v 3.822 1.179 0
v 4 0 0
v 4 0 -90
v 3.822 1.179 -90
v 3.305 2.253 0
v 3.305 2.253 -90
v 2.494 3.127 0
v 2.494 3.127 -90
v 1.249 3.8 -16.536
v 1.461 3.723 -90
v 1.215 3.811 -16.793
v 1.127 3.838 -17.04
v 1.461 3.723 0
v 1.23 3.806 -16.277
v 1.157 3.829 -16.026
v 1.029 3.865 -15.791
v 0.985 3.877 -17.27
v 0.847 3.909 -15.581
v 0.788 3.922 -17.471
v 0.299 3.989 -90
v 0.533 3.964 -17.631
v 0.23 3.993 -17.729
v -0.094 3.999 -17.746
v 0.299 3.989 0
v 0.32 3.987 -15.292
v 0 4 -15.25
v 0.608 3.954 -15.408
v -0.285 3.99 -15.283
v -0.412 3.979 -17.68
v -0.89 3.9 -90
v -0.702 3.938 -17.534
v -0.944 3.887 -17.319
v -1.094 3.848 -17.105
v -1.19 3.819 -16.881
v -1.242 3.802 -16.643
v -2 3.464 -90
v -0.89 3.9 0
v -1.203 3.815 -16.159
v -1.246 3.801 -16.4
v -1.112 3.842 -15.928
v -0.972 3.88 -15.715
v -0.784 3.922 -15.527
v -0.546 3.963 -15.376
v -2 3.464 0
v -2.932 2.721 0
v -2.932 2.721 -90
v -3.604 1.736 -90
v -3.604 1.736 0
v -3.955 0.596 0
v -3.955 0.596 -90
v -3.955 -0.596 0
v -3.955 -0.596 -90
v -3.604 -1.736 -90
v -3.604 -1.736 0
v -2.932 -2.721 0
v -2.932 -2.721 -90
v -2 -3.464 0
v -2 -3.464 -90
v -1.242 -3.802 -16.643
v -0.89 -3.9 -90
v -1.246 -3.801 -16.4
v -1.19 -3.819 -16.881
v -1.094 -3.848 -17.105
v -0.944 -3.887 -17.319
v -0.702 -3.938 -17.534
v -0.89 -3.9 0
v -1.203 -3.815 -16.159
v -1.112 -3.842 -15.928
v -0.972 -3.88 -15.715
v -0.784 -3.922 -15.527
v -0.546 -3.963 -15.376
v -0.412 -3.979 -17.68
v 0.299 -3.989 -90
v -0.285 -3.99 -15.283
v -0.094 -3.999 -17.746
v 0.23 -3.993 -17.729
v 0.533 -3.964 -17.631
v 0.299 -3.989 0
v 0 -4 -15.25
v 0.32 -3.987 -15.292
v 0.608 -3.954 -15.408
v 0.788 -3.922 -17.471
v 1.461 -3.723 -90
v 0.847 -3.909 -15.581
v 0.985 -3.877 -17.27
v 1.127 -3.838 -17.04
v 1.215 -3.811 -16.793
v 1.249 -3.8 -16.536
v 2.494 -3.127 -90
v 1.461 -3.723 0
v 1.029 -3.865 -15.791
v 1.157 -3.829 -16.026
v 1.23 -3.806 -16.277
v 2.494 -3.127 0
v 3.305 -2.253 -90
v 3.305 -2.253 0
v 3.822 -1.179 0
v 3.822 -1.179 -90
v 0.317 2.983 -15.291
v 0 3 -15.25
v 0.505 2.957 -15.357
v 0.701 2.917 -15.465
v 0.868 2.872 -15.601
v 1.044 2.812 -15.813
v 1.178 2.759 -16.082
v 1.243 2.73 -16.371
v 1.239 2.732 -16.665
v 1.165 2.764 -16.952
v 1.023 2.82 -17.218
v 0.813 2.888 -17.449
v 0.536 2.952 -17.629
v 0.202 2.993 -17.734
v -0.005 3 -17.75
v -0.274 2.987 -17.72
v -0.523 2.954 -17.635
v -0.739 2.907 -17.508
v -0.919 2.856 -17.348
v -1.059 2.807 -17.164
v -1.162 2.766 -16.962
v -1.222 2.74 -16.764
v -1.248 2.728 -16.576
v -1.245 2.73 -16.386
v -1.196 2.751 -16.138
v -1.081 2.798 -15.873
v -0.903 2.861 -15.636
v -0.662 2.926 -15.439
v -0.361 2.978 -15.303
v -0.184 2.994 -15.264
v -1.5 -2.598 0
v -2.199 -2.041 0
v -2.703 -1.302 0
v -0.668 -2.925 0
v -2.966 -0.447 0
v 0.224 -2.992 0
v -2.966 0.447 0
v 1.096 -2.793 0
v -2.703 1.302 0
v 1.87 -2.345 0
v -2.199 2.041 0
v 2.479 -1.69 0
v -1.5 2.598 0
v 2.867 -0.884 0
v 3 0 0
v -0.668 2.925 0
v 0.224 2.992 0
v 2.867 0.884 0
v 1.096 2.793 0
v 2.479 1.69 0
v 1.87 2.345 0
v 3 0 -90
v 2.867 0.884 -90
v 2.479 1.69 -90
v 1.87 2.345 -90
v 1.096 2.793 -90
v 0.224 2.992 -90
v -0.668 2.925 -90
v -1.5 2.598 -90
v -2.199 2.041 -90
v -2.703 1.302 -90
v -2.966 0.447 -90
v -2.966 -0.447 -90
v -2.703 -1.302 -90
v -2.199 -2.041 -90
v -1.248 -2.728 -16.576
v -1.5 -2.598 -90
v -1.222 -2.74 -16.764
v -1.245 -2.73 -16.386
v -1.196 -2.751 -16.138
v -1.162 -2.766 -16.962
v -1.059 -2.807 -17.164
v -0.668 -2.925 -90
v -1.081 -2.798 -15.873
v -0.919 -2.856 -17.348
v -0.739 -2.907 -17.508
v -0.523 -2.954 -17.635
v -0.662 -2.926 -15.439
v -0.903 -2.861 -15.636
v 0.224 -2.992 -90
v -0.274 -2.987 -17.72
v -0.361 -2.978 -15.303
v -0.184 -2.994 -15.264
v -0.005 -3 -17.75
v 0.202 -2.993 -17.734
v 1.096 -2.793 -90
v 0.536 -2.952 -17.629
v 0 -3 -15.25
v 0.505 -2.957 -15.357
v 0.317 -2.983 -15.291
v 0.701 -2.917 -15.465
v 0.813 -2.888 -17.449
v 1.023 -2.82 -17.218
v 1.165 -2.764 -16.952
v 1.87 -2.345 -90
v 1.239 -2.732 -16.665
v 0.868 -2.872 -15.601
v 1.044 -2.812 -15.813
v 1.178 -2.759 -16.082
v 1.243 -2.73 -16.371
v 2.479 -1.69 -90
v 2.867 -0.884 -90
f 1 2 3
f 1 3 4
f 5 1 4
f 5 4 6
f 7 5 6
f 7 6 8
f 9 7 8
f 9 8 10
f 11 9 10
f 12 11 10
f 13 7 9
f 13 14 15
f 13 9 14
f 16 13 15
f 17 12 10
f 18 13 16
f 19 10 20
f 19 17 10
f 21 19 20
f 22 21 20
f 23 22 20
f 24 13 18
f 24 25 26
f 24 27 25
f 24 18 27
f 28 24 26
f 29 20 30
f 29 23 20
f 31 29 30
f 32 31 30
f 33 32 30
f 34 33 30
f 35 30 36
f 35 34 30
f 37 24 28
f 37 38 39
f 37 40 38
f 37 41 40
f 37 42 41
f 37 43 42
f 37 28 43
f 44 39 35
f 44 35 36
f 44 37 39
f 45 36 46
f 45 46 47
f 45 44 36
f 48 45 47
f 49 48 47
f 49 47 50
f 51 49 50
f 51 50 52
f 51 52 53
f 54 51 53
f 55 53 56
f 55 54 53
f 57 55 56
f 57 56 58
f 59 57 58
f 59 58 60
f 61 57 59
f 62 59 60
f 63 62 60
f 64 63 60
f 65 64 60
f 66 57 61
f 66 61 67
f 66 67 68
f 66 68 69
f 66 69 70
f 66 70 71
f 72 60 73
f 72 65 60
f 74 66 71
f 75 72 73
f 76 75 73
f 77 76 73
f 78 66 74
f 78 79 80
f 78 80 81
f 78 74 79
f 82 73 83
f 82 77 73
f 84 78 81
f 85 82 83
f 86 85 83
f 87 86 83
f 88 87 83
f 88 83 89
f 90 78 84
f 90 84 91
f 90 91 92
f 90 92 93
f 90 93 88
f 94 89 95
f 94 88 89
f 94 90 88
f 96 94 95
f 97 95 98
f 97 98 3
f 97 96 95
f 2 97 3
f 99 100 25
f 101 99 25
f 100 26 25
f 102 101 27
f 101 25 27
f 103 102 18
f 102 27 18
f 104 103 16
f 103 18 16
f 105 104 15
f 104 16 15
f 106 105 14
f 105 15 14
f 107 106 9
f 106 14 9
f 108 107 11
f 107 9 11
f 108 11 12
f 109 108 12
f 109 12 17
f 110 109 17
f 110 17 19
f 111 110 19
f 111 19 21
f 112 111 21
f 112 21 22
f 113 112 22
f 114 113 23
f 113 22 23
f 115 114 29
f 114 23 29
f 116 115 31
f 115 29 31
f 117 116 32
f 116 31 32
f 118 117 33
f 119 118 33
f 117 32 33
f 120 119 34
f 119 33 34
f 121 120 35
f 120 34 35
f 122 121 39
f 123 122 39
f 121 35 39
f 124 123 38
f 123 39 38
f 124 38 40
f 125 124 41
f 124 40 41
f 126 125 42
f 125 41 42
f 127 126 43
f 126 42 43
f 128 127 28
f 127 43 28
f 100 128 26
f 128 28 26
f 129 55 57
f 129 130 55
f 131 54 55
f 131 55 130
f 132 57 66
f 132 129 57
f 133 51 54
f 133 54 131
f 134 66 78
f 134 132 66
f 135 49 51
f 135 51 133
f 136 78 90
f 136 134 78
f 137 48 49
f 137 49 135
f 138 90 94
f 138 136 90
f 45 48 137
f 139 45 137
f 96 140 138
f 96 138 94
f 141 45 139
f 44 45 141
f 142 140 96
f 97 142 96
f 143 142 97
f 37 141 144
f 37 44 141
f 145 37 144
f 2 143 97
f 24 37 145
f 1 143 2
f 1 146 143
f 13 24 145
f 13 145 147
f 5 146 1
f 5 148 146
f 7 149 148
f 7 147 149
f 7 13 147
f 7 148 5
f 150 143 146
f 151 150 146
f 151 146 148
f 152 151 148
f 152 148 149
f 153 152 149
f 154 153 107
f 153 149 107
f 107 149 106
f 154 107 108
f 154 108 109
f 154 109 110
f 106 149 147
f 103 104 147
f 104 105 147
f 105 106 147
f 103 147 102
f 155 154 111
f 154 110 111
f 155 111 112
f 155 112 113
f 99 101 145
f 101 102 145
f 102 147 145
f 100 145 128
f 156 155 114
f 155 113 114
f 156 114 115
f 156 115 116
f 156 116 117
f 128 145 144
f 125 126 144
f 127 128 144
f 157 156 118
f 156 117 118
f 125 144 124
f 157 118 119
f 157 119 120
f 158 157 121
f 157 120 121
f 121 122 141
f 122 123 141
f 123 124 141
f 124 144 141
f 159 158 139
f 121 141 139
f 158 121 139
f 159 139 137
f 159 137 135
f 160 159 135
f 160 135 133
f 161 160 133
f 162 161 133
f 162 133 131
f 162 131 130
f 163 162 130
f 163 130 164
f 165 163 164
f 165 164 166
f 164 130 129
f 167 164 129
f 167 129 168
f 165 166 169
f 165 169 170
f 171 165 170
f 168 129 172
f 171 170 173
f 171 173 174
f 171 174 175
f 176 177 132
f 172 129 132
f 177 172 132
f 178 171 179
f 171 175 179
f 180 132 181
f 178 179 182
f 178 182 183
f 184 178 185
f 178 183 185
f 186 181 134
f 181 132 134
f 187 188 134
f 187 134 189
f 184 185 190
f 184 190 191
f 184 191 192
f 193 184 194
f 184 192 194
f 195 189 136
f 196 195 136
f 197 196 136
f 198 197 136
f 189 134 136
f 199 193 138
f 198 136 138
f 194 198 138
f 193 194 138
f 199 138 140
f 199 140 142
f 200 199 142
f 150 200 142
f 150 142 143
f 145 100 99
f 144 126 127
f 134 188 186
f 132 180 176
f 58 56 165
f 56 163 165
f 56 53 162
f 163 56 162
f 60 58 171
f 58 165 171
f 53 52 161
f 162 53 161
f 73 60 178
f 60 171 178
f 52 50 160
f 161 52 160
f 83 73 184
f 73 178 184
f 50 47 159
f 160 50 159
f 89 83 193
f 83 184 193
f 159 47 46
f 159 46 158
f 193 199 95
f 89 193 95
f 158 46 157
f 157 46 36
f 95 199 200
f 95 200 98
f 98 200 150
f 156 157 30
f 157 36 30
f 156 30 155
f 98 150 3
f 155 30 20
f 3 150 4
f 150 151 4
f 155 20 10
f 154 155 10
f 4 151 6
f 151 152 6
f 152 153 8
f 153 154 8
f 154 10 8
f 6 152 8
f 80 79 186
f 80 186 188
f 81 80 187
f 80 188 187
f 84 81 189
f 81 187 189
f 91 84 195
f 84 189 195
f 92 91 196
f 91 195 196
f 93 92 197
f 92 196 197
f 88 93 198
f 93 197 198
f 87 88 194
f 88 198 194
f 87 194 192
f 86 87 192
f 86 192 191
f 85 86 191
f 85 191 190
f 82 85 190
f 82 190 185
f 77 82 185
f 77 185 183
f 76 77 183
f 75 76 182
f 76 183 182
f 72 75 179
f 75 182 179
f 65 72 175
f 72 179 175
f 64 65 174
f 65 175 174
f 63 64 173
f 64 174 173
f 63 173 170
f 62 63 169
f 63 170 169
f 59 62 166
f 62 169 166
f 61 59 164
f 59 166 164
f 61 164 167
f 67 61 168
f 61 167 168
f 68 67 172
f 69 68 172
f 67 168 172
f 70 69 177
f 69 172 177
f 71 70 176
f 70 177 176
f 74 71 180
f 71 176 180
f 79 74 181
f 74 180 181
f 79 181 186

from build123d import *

# Parameters (mm, degrees)
ESQUISSE1_R               = 4
BOSS_EXTRU_1_DEPTH        = 90
ESQUISSE2_R               = 1.25
ENL_V_MAT_EXTRU_1_DEPTH   = 10
TROU_TARAUD_M3X0_51_D     = 2.5
TROU_TARAUD_M3X0_51_DEPTH = 12.5
TROU_TARAUD_M3X0_51_TIP   = 0.751075774
ESQUISSE6_R               = 3
ENL_V_MAT_EXTRU_2_DEPTH   = 91.177602649


with BuildPart() as part:
    # Esquisse1 → Boss.-Extru.1 (new body)
    with BuildSketch(Plane.XY):
        Circle(ESQUISSE1_R)
    extrude(amount=-BOSS_EXTRU_1_DEPTH)

    # Esquisse2 → Enlèv. mat.-Extru.1 (cut, symmetric)
    with BuildSketch(Plane(origin=(0, 0, 0), x_dir=(1, 0, 0), z_dir=(0, 1, 0))):
        with Locations(Location((0, 16.5, 0), (0, 0, 270))):
            Circle(ESQUISSE2_R)
    extrude(amount=ENL_V_MAT_EXTRU_1_DEPTH, both=True, mode=Mode.SUBTRACT)

    # Trou taraudé M3x0.51
    with Locations(Plane(origin=(0, 0, -90), x_dir=(-1, 0, 0), z_dir=(0, 0, -1))):
        with Locations((0, 0)):
            Hole(TROU_TARAUD_M3X0_51_D / 2, depth=TROU_TARAUD_M3X0_51_DEPTH)
            with Locations((0, 0, -(TROU_TARAUD_M3X0_51_DEPTH + TROU_TARAUD_M3X0_51_TIP / 2))):  # 118° drill point
                Cone(0, TROU_TARAUD_M3X0_51_D / 2, TROU_TARAUD_M3X0_51_TIP, mode=Mode.SUBTRACT)

    # Esquisse6 → Enlèv. mat.-Extru.2 (cut, through all)
    with BuildSketch(Plane.XY):
        Circle(ESQUISSE6_R)
    extrude(amount=-ENL_V_MAT_EXTRU_2_DEPTH, mode=Mode.SUBTRACT)


solid = part.part
